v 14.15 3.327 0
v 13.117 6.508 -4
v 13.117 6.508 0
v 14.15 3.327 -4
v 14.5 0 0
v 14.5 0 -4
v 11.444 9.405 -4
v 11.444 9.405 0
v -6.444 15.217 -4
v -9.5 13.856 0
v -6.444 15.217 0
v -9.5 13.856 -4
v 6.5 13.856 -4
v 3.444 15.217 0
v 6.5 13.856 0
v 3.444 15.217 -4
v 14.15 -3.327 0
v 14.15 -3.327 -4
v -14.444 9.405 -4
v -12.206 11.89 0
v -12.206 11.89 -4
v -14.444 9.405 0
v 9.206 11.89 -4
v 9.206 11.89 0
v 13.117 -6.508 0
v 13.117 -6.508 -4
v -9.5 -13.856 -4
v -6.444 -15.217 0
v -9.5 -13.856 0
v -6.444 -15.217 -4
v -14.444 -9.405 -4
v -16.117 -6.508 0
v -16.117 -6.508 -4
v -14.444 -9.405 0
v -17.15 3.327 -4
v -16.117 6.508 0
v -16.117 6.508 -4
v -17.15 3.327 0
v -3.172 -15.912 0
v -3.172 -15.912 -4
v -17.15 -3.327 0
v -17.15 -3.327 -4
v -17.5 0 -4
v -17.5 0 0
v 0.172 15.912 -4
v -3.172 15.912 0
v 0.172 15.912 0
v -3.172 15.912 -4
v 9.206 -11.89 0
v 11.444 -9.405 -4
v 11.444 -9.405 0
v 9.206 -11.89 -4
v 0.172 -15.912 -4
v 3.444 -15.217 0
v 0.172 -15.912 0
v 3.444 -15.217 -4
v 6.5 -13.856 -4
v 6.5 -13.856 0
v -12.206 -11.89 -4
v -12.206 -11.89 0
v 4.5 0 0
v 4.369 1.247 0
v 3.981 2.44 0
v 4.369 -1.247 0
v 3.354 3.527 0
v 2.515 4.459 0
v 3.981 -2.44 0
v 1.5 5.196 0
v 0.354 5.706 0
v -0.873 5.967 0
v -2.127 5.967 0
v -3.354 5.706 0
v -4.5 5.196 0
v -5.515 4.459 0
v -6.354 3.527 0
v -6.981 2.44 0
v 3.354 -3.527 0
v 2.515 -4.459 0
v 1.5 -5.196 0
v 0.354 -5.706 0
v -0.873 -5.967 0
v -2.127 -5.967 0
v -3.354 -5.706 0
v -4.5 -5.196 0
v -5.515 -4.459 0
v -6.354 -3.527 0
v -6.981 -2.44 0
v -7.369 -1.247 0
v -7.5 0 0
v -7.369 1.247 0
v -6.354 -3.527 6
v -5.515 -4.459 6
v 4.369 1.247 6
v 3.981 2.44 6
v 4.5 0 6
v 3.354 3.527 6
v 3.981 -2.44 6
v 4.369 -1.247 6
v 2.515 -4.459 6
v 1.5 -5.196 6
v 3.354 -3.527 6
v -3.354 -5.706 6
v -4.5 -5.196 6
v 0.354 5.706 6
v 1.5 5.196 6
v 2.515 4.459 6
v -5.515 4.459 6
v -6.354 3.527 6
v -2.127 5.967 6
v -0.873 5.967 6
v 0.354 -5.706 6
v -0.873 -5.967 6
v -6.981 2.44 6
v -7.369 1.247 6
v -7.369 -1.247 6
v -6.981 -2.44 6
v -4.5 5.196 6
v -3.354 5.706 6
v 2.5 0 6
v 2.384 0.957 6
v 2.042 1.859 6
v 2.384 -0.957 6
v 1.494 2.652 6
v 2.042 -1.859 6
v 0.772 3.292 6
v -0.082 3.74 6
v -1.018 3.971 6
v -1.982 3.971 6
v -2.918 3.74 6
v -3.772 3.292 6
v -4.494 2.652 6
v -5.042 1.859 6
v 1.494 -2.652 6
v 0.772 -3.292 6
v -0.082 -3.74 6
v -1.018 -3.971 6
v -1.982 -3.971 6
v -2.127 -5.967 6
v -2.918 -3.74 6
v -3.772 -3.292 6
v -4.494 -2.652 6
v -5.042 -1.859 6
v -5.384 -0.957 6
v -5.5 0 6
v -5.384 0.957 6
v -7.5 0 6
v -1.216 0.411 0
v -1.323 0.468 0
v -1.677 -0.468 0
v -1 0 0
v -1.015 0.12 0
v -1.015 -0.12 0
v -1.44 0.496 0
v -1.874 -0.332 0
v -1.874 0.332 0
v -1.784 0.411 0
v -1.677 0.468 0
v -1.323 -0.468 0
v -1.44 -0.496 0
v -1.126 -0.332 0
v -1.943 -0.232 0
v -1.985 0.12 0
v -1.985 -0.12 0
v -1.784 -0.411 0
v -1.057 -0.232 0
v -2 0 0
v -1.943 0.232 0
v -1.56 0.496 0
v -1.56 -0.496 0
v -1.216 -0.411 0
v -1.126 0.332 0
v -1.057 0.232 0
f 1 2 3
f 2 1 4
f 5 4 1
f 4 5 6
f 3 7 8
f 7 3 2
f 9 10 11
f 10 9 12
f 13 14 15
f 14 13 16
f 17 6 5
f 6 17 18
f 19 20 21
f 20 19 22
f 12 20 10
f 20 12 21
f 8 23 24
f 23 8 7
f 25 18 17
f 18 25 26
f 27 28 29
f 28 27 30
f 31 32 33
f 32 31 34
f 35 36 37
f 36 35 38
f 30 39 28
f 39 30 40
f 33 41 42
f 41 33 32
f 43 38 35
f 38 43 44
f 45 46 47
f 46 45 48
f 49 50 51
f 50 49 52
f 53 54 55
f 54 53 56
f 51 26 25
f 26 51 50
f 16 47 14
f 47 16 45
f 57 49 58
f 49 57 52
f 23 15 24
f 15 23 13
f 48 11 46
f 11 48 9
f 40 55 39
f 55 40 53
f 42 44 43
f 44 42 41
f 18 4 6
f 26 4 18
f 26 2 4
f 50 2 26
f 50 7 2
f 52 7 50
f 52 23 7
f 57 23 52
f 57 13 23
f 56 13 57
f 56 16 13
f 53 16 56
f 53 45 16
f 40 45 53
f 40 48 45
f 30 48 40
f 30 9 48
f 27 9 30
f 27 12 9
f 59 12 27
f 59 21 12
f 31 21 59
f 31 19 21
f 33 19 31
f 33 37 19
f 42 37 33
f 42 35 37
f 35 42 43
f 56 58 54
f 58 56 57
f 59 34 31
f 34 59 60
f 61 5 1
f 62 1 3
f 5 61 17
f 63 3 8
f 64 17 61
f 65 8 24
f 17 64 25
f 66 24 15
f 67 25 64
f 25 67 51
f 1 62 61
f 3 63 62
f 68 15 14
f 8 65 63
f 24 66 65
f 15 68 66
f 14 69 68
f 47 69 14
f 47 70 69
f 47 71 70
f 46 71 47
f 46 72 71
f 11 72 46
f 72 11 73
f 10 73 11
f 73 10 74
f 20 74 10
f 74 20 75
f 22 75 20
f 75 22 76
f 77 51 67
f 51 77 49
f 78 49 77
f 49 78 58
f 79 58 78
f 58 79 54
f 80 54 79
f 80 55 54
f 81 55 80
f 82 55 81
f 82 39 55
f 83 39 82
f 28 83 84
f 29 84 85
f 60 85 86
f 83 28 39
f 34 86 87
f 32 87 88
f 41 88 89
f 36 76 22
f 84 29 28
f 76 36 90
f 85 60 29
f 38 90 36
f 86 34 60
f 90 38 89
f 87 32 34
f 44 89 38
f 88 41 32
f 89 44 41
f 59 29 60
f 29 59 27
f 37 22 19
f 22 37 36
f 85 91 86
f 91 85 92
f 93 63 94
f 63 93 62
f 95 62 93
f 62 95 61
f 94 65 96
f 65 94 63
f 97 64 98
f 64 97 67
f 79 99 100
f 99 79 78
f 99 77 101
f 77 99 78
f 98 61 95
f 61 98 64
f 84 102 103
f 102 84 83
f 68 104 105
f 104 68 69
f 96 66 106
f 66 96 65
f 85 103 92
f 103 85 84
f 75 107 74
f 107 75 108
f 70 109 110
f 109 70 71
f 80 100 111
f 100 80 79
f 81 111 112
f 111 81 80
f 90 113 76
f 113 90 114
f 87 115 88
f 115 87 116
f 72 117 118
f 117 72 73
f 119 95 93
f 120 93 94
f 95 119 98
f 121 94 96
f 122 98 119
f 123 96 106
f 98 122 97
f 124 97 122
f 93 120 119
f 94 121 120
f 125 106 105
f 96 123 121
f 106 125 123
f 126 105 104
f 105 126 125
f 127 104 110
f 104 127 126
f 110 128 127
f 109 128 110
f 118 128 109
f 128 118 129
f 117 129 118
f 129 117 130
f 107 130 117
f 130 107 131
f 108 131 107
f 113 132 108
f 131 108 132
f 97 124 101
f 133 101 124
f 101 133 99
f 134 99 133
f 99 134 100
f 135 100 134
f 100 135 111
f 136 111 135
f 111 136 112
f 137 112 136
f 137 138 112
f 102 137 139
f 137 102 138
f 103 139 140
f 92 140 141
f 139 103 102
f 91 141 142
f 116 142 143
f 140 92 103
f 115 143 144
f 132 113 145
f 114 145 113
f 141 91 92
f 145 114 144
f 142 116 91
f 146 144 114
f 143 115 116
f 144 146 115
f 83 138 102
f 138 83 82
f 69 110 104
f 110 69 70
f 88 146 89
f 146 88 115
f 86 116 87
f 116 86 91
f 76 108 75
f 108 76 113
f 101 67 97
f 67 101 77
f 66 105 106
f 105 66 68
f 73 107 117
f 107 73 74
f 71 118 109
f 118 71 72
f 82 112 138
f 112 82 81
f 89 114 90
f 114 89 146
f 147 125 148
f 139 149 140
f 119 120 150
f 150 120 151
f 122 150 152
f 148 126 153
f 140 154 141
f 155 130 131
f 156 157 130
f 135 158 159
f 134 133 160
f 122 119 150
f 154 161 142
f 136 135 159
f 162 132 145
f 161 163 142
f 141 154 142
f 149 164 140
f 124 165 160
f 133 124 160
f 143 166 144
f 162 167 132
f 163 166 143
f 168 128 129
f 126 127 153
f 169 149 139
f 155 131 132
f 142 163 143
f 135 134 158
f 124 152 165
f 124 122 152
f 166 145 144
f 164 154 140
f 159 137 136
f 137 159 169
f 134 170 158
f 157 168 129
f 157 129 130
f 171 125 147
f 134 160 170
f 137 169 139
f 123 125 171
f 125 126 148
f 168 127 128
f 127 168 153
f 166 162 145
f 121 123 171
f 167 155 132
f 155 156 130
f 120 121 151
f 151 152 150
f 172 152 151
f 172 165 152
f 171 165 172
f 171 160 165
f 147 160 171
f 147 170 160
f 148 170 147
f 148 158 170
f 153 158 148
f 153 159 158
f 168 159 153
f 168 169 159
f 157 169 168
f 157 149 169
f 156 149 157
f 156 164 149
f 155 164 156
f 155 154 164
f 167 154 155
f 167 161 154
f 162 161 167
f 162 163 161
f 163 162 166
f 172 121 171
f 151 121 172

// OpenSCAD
$fs=1;

t=0.5;

Ya=50;
Yb=50;
Y=Ya+Yb;

//Z=32;
frontX=100; //can't be changed
frontZ=25; //can't be changed
frontY=2; //can't be changed
pcbX=frontX-7;
pcbY=50;
pcbZu=3.5;
pcbZ=1.5;

pcbMdist=18;
pcbJdist=16;

//frontSpZ=1;
frontSp=1.5;
X=frontX+frontSp*2;
//Za=frontZ+frontSpZ*2;
Zb=10;
bottomZ=3;
pcb2frontBtm=5;
pcb2bottom=bottomZ+pcbZu;
//bottomZ=pcb2frontBtm+frontSpZ-pcbZu;
scrwDia=3.3;
scrwXsp=3.5;
scrwYsp=10;

nutADia=6.5;
nutBDia=8.2;
scrwBdist=4;
scrwBDia=4.2;
pcb2frontBtm=5;
topZ=2.5;

frameW=(X-pcbX)/2-1;

arcBtnD=30;
arcBtnDist=50;

potDia= 2.5;
potX=9;
potY=45.2;
potTrvl=40;
potZ=1;
potSp=1.5;

dcYpos=16;
dcY=9.5;
dcZ=11.5;

module frontStl() {
translate([(X-frontX)/2,0,-pcb2frontBtm])rotate([-90,0,0])import("./AxoStomp-front.stl", convexity=10);
//import("./front_fixed.stl", convexity=10);
}


module baseStl() {

translate([0,0,-pcb2bottom]){
difference(){
translate([0,-frontY,0])cube([X,frontY,bottomZ]);
translate([(X-frontX)/2,-frontY,pcb2bottom-pcb2frontBtm])cube([frontX,frontY,bottomZ]);}
difference(){
union(){
cube([X,Y,bottomZ+0.0001]);
translate([frameW+(X-frameW*4)/4-pcbMdist/2,Ya/2+pcbJdist,0])cylinder(d=scrwDia*2.5, h=pcb2bottom,$fn=12);
translate([frameW+(X-frameW*4)/4+pcbMdist/2,Ya/2+pcbJdist,0])cylinder(d=scrwDia*2.5, h=pcb2bottom,$fn=12);
}
translate([frameW+(X-frameW*4)/4-pcbMdist/2,Ya/2+pcbJdist,0])cylinder(d=scrwDia-t, h=pcb2bottom,$fn=12);
translate([frameW+(X-frameW*4)/4+pcbMdist/2,Ya/2+pcbJdist,0])cylinder(d=scrwDia-t, h=pcb2bottom,$fn=12);

translate([0,0,20])cube([frontX,frontY,10]);
}
}}




module topA(subtract,print){
y=Ya;
ySp=frameW*4;
zPos=frontZ-pcb2frontBtm-frontSp;
potSpZ=2.5;


rotate([print*180,0,0]){
if(subtract==0 && print < 2){
difference(){
union(){
translate([0,0,zPos])cube([X,y,topZ]);
//translate([X/2,(y-potY)/4,zPos-potZ/2])cube([X-frameW*2,(y-potY)/2,potZ],center=true);
//translate([frameW/2+(X/2-frameW)/2,y-(y-potY)/4,zPos-potZ/2])cube([X/2-frameW*2,(y-potY)/2,potZ],center=true);
//translate([(frameW/2+(X/2-frameW)/2)+X/2,y-(y-potY)/4,zPos-potZ/2])cube([X/2-frameW*2,(y-potY)/2,potZ],center=true);
       }

translate([frameW+(X-frameW*4)/4,y/2,zPos-potZ/2])cylinder(h=10,d=20);
translate([frameW*3+(X-frameW*4)/4*3,y/2,zPos-potZ/2])cylinder(h=10,d=arcBtnD);

}


difference(){
translate([0,-frontY,zPos])cube([X,frontY,topZ]);
translate([(X-frontX)/2,-frontY,zPos-topZ+frontSp])cube([frontX,frontY,topZ]);}
}

if(print==2 && subtract == 0){
difference(){

//translate([(ySp-potX/2)+((X-ySp*2)+potX)/2,y*1/2,0])cube([(X-ySp*2)+potX,9,potSpZ],center=true);

}
}


if (print <= 1)translate([0,0,zPos])topMount(y,subtract);


}
}

module topB(subtract,print){
zPos=frontZ-pcb2frontBtm-frontSp;

a=Y-Ya;
b=frontZ-(pcb2frontBtm-pcbZu)-frontSp-(Zb-bottomZ);
//b=frontZ-(bottomZ-frontSpZ)-frontSpZ-Zb+bottomZ;
c=sqrt(pow(a,2)+pow(b,2));
y=c;
//echo (c);
w= acos(a/c)*((print-1)*-1)-(print)*180;
//echo (w); 

translate([0,Ya,zPos])rotate([-w,0,0]){
if(subtract==0){
difference(){
cube([X,c,topZ]);
translate([(X-3*arcBtnDist-arcBtnD)/2,0,0]){
translate([arcBtnD/2,c/2,0])cylinder(d=arcBtnD,h=topZ);
translate([arcBtnD/2+arcBtnDist,c/2,0])cylinder(d=arcBtnD,h=topZ);
translate([arcBtnD/2+2*arcBtnDist,c/2,0])cylinder(d=arcBtnD,h=topZ);
translate([arcBtnD/2+3*arcBtnDist,c/2,0])cylinder(d=arcBtnD,h=topZ);}

translate([X/2,c*3/4,0])cylinder(d=scrwDia,h=topZ);
translate([X/2,c*1/4,0])cylinder(d=scrwDia,h=topZ);
}
}
if(subtract==1){
translate([X/2,c*3/4,-Zb])cylinder(d=scrwDia-t,h=Zb);
translate([X/2,c*1/4,-Zb])cylinder(d=scrwDia-t,h=Zb);
translate([X/2,c*1/2,0])rotate([0,90,0])cylinder(d=8,h=frameW*2+t,center=true);
}

topMount(y,subtract);



}
}
module topMount(y,subtract){
translate([0,0,0]){
if(subtract==0){
difference(){
hull(){
translate([frameW,y/4,-2])cube([frameW,y/2,2]);
translate([frameW,y/2,-scrwBdist])rotate([0,90,0])cylinder(d=scrwBDia*3,h=frameW);}
translate([frameW,y/2,-scrwBdist])rotate([0,90,0])cylinder(d=scrwBDia,h=frameW);
translate([frameW+frameW/2,y/2,-scrwBdist])rotate([30,0,0])rotate([0,90,0])cylinder(d=nutBDia,h=frameW,$fn=6);
}}
if(subtract==1)translate([-frameW*2,y/2,-scrwBdist])rotate([0,90,0])cylinder(d=scrwBDia,h=frameW*4);

translate([X-frameW*3,0,0]){
if(subtract==0){
difference(){
hull(){
translate([frameW,y/4,-2])cube([frameW,y/2,2]);
translate([frameW,y/2,-scrwBdist])rotate([0,90,0])cylinder(d=scrwBDia*3,h=frameW);}
translate([frameW,y/2,-scrwBdist])rotate([0,90,0])cylinder(d=scrwBDia,h=frameW);
translate([frameW-frameW/2,y/2,-scrwBdist])rotate([30,0,0])rotate([0,90,0])cylinder(d=nutBDia,h=frameW,$fn=6);
}}
if(subtract==1)translate([frameW,y/2,-scrwBdist])rotate([0,90,0])cylinder(d=scrwBDia,h=frameW*4);
}
}
}
module winkel(){
height=Y;
width=frameW;
middleX=scrwDia;
length=frontZ-(pcb2frontBtm-pcbZu)-frontSp;
echo (length);

thickH=5;
thickW=5;
thickL=5;

screwDia=5.3;
screwDist=25;
screwPosL=15;
screwPosW=(width-thickW)/2;
screwZ =10;

topAspZ = 10;

wallkneeA=Ya;
wallkneeB=Zb-bottomZ;
difference(){
union(){
translate([width,0,-pcbZu])rotate([0,-90,0]){
difference(){
rotate([0,0,0])linear_extrude(height=width, convexity= 100)
    polygon(points = [ [0,0],[length,0],[length,wallkneeA],[wallkneeB,height],[0,height] ], convexity = 1);
}
translate([0,-frontY,width-frontSp])cube([length,frontY,frontSp]);

translate([0,0,-(X-width)]){
difference(){
rotate([0,0,0])linear_extrude(height=middleX, convexity= 100)
    polygon(points = [ [0,0],[length,0],[length,wallkneeA],[wallkneeB,height],[0,height] ], convexity = 1);
//translate([pcbZu+pcbZ,dcYpos,0])cube([dcZ,dcY,frameW]);
}
translate([0,-frontY,0])cube([length,frontY,frontSp]);
}
translate([0,0,-X/2]){

difference(){
rotate([0,0,0])linear_extrude(height=width*2, convexity= 100)
    polygon(points = [ [0,0],[length,0],[length,wallkneeA],[wallkneeB,height],[0,height] ], convexity = 1);

difference(){
difference(){
//cube([length,Ya,width*2]);
//translate([length-topAspZ,Ya,0])rotate([0,0,-40])cube([length,Ya/3,width*2]);
union(){
translate([length-5,wallkneeA/2+screwDist/2,width])rotate([0,90,0])cylinder(d=scrwDia-t, h=screwZ,$fn=12);
translate([length-5,wallkneeA/2-screwDist/2,width])rotate([0,90,0])cylinder(d=scrwDia-t, h=screwZ,$fn=12);
translate([length/2,10,width])rotate([90,0,0])cylinder(d=scrwDia-t, h=screwZ,$fn=12);
}
}}

//translate([length-10,Ya-5,frameW])rotate([0,90,0])cylinder(d=scrwDia-t,h=10);
}
}

}
translate([0,Y-width,-pcbZu])cube([X,width,Zb-bottomZ]);
}
topA(1,0);
topB(1,0);
}
}

module nunBtn(){

difference(){
union(){
translate([0,0,-4])cylinder(h=4,d=32);
cylinder(h=6,d=12);}
translate([0,0,0])cylinder(h=6,d1=1,d2=8);
}}

translate([-frontSp,0,0]){
//baseStl();
//rotate([0,0,0])color([1,0,0])frontStl();
//winkel();
//topA(0,1);
nunBtn();
//topB(0,1);
}
